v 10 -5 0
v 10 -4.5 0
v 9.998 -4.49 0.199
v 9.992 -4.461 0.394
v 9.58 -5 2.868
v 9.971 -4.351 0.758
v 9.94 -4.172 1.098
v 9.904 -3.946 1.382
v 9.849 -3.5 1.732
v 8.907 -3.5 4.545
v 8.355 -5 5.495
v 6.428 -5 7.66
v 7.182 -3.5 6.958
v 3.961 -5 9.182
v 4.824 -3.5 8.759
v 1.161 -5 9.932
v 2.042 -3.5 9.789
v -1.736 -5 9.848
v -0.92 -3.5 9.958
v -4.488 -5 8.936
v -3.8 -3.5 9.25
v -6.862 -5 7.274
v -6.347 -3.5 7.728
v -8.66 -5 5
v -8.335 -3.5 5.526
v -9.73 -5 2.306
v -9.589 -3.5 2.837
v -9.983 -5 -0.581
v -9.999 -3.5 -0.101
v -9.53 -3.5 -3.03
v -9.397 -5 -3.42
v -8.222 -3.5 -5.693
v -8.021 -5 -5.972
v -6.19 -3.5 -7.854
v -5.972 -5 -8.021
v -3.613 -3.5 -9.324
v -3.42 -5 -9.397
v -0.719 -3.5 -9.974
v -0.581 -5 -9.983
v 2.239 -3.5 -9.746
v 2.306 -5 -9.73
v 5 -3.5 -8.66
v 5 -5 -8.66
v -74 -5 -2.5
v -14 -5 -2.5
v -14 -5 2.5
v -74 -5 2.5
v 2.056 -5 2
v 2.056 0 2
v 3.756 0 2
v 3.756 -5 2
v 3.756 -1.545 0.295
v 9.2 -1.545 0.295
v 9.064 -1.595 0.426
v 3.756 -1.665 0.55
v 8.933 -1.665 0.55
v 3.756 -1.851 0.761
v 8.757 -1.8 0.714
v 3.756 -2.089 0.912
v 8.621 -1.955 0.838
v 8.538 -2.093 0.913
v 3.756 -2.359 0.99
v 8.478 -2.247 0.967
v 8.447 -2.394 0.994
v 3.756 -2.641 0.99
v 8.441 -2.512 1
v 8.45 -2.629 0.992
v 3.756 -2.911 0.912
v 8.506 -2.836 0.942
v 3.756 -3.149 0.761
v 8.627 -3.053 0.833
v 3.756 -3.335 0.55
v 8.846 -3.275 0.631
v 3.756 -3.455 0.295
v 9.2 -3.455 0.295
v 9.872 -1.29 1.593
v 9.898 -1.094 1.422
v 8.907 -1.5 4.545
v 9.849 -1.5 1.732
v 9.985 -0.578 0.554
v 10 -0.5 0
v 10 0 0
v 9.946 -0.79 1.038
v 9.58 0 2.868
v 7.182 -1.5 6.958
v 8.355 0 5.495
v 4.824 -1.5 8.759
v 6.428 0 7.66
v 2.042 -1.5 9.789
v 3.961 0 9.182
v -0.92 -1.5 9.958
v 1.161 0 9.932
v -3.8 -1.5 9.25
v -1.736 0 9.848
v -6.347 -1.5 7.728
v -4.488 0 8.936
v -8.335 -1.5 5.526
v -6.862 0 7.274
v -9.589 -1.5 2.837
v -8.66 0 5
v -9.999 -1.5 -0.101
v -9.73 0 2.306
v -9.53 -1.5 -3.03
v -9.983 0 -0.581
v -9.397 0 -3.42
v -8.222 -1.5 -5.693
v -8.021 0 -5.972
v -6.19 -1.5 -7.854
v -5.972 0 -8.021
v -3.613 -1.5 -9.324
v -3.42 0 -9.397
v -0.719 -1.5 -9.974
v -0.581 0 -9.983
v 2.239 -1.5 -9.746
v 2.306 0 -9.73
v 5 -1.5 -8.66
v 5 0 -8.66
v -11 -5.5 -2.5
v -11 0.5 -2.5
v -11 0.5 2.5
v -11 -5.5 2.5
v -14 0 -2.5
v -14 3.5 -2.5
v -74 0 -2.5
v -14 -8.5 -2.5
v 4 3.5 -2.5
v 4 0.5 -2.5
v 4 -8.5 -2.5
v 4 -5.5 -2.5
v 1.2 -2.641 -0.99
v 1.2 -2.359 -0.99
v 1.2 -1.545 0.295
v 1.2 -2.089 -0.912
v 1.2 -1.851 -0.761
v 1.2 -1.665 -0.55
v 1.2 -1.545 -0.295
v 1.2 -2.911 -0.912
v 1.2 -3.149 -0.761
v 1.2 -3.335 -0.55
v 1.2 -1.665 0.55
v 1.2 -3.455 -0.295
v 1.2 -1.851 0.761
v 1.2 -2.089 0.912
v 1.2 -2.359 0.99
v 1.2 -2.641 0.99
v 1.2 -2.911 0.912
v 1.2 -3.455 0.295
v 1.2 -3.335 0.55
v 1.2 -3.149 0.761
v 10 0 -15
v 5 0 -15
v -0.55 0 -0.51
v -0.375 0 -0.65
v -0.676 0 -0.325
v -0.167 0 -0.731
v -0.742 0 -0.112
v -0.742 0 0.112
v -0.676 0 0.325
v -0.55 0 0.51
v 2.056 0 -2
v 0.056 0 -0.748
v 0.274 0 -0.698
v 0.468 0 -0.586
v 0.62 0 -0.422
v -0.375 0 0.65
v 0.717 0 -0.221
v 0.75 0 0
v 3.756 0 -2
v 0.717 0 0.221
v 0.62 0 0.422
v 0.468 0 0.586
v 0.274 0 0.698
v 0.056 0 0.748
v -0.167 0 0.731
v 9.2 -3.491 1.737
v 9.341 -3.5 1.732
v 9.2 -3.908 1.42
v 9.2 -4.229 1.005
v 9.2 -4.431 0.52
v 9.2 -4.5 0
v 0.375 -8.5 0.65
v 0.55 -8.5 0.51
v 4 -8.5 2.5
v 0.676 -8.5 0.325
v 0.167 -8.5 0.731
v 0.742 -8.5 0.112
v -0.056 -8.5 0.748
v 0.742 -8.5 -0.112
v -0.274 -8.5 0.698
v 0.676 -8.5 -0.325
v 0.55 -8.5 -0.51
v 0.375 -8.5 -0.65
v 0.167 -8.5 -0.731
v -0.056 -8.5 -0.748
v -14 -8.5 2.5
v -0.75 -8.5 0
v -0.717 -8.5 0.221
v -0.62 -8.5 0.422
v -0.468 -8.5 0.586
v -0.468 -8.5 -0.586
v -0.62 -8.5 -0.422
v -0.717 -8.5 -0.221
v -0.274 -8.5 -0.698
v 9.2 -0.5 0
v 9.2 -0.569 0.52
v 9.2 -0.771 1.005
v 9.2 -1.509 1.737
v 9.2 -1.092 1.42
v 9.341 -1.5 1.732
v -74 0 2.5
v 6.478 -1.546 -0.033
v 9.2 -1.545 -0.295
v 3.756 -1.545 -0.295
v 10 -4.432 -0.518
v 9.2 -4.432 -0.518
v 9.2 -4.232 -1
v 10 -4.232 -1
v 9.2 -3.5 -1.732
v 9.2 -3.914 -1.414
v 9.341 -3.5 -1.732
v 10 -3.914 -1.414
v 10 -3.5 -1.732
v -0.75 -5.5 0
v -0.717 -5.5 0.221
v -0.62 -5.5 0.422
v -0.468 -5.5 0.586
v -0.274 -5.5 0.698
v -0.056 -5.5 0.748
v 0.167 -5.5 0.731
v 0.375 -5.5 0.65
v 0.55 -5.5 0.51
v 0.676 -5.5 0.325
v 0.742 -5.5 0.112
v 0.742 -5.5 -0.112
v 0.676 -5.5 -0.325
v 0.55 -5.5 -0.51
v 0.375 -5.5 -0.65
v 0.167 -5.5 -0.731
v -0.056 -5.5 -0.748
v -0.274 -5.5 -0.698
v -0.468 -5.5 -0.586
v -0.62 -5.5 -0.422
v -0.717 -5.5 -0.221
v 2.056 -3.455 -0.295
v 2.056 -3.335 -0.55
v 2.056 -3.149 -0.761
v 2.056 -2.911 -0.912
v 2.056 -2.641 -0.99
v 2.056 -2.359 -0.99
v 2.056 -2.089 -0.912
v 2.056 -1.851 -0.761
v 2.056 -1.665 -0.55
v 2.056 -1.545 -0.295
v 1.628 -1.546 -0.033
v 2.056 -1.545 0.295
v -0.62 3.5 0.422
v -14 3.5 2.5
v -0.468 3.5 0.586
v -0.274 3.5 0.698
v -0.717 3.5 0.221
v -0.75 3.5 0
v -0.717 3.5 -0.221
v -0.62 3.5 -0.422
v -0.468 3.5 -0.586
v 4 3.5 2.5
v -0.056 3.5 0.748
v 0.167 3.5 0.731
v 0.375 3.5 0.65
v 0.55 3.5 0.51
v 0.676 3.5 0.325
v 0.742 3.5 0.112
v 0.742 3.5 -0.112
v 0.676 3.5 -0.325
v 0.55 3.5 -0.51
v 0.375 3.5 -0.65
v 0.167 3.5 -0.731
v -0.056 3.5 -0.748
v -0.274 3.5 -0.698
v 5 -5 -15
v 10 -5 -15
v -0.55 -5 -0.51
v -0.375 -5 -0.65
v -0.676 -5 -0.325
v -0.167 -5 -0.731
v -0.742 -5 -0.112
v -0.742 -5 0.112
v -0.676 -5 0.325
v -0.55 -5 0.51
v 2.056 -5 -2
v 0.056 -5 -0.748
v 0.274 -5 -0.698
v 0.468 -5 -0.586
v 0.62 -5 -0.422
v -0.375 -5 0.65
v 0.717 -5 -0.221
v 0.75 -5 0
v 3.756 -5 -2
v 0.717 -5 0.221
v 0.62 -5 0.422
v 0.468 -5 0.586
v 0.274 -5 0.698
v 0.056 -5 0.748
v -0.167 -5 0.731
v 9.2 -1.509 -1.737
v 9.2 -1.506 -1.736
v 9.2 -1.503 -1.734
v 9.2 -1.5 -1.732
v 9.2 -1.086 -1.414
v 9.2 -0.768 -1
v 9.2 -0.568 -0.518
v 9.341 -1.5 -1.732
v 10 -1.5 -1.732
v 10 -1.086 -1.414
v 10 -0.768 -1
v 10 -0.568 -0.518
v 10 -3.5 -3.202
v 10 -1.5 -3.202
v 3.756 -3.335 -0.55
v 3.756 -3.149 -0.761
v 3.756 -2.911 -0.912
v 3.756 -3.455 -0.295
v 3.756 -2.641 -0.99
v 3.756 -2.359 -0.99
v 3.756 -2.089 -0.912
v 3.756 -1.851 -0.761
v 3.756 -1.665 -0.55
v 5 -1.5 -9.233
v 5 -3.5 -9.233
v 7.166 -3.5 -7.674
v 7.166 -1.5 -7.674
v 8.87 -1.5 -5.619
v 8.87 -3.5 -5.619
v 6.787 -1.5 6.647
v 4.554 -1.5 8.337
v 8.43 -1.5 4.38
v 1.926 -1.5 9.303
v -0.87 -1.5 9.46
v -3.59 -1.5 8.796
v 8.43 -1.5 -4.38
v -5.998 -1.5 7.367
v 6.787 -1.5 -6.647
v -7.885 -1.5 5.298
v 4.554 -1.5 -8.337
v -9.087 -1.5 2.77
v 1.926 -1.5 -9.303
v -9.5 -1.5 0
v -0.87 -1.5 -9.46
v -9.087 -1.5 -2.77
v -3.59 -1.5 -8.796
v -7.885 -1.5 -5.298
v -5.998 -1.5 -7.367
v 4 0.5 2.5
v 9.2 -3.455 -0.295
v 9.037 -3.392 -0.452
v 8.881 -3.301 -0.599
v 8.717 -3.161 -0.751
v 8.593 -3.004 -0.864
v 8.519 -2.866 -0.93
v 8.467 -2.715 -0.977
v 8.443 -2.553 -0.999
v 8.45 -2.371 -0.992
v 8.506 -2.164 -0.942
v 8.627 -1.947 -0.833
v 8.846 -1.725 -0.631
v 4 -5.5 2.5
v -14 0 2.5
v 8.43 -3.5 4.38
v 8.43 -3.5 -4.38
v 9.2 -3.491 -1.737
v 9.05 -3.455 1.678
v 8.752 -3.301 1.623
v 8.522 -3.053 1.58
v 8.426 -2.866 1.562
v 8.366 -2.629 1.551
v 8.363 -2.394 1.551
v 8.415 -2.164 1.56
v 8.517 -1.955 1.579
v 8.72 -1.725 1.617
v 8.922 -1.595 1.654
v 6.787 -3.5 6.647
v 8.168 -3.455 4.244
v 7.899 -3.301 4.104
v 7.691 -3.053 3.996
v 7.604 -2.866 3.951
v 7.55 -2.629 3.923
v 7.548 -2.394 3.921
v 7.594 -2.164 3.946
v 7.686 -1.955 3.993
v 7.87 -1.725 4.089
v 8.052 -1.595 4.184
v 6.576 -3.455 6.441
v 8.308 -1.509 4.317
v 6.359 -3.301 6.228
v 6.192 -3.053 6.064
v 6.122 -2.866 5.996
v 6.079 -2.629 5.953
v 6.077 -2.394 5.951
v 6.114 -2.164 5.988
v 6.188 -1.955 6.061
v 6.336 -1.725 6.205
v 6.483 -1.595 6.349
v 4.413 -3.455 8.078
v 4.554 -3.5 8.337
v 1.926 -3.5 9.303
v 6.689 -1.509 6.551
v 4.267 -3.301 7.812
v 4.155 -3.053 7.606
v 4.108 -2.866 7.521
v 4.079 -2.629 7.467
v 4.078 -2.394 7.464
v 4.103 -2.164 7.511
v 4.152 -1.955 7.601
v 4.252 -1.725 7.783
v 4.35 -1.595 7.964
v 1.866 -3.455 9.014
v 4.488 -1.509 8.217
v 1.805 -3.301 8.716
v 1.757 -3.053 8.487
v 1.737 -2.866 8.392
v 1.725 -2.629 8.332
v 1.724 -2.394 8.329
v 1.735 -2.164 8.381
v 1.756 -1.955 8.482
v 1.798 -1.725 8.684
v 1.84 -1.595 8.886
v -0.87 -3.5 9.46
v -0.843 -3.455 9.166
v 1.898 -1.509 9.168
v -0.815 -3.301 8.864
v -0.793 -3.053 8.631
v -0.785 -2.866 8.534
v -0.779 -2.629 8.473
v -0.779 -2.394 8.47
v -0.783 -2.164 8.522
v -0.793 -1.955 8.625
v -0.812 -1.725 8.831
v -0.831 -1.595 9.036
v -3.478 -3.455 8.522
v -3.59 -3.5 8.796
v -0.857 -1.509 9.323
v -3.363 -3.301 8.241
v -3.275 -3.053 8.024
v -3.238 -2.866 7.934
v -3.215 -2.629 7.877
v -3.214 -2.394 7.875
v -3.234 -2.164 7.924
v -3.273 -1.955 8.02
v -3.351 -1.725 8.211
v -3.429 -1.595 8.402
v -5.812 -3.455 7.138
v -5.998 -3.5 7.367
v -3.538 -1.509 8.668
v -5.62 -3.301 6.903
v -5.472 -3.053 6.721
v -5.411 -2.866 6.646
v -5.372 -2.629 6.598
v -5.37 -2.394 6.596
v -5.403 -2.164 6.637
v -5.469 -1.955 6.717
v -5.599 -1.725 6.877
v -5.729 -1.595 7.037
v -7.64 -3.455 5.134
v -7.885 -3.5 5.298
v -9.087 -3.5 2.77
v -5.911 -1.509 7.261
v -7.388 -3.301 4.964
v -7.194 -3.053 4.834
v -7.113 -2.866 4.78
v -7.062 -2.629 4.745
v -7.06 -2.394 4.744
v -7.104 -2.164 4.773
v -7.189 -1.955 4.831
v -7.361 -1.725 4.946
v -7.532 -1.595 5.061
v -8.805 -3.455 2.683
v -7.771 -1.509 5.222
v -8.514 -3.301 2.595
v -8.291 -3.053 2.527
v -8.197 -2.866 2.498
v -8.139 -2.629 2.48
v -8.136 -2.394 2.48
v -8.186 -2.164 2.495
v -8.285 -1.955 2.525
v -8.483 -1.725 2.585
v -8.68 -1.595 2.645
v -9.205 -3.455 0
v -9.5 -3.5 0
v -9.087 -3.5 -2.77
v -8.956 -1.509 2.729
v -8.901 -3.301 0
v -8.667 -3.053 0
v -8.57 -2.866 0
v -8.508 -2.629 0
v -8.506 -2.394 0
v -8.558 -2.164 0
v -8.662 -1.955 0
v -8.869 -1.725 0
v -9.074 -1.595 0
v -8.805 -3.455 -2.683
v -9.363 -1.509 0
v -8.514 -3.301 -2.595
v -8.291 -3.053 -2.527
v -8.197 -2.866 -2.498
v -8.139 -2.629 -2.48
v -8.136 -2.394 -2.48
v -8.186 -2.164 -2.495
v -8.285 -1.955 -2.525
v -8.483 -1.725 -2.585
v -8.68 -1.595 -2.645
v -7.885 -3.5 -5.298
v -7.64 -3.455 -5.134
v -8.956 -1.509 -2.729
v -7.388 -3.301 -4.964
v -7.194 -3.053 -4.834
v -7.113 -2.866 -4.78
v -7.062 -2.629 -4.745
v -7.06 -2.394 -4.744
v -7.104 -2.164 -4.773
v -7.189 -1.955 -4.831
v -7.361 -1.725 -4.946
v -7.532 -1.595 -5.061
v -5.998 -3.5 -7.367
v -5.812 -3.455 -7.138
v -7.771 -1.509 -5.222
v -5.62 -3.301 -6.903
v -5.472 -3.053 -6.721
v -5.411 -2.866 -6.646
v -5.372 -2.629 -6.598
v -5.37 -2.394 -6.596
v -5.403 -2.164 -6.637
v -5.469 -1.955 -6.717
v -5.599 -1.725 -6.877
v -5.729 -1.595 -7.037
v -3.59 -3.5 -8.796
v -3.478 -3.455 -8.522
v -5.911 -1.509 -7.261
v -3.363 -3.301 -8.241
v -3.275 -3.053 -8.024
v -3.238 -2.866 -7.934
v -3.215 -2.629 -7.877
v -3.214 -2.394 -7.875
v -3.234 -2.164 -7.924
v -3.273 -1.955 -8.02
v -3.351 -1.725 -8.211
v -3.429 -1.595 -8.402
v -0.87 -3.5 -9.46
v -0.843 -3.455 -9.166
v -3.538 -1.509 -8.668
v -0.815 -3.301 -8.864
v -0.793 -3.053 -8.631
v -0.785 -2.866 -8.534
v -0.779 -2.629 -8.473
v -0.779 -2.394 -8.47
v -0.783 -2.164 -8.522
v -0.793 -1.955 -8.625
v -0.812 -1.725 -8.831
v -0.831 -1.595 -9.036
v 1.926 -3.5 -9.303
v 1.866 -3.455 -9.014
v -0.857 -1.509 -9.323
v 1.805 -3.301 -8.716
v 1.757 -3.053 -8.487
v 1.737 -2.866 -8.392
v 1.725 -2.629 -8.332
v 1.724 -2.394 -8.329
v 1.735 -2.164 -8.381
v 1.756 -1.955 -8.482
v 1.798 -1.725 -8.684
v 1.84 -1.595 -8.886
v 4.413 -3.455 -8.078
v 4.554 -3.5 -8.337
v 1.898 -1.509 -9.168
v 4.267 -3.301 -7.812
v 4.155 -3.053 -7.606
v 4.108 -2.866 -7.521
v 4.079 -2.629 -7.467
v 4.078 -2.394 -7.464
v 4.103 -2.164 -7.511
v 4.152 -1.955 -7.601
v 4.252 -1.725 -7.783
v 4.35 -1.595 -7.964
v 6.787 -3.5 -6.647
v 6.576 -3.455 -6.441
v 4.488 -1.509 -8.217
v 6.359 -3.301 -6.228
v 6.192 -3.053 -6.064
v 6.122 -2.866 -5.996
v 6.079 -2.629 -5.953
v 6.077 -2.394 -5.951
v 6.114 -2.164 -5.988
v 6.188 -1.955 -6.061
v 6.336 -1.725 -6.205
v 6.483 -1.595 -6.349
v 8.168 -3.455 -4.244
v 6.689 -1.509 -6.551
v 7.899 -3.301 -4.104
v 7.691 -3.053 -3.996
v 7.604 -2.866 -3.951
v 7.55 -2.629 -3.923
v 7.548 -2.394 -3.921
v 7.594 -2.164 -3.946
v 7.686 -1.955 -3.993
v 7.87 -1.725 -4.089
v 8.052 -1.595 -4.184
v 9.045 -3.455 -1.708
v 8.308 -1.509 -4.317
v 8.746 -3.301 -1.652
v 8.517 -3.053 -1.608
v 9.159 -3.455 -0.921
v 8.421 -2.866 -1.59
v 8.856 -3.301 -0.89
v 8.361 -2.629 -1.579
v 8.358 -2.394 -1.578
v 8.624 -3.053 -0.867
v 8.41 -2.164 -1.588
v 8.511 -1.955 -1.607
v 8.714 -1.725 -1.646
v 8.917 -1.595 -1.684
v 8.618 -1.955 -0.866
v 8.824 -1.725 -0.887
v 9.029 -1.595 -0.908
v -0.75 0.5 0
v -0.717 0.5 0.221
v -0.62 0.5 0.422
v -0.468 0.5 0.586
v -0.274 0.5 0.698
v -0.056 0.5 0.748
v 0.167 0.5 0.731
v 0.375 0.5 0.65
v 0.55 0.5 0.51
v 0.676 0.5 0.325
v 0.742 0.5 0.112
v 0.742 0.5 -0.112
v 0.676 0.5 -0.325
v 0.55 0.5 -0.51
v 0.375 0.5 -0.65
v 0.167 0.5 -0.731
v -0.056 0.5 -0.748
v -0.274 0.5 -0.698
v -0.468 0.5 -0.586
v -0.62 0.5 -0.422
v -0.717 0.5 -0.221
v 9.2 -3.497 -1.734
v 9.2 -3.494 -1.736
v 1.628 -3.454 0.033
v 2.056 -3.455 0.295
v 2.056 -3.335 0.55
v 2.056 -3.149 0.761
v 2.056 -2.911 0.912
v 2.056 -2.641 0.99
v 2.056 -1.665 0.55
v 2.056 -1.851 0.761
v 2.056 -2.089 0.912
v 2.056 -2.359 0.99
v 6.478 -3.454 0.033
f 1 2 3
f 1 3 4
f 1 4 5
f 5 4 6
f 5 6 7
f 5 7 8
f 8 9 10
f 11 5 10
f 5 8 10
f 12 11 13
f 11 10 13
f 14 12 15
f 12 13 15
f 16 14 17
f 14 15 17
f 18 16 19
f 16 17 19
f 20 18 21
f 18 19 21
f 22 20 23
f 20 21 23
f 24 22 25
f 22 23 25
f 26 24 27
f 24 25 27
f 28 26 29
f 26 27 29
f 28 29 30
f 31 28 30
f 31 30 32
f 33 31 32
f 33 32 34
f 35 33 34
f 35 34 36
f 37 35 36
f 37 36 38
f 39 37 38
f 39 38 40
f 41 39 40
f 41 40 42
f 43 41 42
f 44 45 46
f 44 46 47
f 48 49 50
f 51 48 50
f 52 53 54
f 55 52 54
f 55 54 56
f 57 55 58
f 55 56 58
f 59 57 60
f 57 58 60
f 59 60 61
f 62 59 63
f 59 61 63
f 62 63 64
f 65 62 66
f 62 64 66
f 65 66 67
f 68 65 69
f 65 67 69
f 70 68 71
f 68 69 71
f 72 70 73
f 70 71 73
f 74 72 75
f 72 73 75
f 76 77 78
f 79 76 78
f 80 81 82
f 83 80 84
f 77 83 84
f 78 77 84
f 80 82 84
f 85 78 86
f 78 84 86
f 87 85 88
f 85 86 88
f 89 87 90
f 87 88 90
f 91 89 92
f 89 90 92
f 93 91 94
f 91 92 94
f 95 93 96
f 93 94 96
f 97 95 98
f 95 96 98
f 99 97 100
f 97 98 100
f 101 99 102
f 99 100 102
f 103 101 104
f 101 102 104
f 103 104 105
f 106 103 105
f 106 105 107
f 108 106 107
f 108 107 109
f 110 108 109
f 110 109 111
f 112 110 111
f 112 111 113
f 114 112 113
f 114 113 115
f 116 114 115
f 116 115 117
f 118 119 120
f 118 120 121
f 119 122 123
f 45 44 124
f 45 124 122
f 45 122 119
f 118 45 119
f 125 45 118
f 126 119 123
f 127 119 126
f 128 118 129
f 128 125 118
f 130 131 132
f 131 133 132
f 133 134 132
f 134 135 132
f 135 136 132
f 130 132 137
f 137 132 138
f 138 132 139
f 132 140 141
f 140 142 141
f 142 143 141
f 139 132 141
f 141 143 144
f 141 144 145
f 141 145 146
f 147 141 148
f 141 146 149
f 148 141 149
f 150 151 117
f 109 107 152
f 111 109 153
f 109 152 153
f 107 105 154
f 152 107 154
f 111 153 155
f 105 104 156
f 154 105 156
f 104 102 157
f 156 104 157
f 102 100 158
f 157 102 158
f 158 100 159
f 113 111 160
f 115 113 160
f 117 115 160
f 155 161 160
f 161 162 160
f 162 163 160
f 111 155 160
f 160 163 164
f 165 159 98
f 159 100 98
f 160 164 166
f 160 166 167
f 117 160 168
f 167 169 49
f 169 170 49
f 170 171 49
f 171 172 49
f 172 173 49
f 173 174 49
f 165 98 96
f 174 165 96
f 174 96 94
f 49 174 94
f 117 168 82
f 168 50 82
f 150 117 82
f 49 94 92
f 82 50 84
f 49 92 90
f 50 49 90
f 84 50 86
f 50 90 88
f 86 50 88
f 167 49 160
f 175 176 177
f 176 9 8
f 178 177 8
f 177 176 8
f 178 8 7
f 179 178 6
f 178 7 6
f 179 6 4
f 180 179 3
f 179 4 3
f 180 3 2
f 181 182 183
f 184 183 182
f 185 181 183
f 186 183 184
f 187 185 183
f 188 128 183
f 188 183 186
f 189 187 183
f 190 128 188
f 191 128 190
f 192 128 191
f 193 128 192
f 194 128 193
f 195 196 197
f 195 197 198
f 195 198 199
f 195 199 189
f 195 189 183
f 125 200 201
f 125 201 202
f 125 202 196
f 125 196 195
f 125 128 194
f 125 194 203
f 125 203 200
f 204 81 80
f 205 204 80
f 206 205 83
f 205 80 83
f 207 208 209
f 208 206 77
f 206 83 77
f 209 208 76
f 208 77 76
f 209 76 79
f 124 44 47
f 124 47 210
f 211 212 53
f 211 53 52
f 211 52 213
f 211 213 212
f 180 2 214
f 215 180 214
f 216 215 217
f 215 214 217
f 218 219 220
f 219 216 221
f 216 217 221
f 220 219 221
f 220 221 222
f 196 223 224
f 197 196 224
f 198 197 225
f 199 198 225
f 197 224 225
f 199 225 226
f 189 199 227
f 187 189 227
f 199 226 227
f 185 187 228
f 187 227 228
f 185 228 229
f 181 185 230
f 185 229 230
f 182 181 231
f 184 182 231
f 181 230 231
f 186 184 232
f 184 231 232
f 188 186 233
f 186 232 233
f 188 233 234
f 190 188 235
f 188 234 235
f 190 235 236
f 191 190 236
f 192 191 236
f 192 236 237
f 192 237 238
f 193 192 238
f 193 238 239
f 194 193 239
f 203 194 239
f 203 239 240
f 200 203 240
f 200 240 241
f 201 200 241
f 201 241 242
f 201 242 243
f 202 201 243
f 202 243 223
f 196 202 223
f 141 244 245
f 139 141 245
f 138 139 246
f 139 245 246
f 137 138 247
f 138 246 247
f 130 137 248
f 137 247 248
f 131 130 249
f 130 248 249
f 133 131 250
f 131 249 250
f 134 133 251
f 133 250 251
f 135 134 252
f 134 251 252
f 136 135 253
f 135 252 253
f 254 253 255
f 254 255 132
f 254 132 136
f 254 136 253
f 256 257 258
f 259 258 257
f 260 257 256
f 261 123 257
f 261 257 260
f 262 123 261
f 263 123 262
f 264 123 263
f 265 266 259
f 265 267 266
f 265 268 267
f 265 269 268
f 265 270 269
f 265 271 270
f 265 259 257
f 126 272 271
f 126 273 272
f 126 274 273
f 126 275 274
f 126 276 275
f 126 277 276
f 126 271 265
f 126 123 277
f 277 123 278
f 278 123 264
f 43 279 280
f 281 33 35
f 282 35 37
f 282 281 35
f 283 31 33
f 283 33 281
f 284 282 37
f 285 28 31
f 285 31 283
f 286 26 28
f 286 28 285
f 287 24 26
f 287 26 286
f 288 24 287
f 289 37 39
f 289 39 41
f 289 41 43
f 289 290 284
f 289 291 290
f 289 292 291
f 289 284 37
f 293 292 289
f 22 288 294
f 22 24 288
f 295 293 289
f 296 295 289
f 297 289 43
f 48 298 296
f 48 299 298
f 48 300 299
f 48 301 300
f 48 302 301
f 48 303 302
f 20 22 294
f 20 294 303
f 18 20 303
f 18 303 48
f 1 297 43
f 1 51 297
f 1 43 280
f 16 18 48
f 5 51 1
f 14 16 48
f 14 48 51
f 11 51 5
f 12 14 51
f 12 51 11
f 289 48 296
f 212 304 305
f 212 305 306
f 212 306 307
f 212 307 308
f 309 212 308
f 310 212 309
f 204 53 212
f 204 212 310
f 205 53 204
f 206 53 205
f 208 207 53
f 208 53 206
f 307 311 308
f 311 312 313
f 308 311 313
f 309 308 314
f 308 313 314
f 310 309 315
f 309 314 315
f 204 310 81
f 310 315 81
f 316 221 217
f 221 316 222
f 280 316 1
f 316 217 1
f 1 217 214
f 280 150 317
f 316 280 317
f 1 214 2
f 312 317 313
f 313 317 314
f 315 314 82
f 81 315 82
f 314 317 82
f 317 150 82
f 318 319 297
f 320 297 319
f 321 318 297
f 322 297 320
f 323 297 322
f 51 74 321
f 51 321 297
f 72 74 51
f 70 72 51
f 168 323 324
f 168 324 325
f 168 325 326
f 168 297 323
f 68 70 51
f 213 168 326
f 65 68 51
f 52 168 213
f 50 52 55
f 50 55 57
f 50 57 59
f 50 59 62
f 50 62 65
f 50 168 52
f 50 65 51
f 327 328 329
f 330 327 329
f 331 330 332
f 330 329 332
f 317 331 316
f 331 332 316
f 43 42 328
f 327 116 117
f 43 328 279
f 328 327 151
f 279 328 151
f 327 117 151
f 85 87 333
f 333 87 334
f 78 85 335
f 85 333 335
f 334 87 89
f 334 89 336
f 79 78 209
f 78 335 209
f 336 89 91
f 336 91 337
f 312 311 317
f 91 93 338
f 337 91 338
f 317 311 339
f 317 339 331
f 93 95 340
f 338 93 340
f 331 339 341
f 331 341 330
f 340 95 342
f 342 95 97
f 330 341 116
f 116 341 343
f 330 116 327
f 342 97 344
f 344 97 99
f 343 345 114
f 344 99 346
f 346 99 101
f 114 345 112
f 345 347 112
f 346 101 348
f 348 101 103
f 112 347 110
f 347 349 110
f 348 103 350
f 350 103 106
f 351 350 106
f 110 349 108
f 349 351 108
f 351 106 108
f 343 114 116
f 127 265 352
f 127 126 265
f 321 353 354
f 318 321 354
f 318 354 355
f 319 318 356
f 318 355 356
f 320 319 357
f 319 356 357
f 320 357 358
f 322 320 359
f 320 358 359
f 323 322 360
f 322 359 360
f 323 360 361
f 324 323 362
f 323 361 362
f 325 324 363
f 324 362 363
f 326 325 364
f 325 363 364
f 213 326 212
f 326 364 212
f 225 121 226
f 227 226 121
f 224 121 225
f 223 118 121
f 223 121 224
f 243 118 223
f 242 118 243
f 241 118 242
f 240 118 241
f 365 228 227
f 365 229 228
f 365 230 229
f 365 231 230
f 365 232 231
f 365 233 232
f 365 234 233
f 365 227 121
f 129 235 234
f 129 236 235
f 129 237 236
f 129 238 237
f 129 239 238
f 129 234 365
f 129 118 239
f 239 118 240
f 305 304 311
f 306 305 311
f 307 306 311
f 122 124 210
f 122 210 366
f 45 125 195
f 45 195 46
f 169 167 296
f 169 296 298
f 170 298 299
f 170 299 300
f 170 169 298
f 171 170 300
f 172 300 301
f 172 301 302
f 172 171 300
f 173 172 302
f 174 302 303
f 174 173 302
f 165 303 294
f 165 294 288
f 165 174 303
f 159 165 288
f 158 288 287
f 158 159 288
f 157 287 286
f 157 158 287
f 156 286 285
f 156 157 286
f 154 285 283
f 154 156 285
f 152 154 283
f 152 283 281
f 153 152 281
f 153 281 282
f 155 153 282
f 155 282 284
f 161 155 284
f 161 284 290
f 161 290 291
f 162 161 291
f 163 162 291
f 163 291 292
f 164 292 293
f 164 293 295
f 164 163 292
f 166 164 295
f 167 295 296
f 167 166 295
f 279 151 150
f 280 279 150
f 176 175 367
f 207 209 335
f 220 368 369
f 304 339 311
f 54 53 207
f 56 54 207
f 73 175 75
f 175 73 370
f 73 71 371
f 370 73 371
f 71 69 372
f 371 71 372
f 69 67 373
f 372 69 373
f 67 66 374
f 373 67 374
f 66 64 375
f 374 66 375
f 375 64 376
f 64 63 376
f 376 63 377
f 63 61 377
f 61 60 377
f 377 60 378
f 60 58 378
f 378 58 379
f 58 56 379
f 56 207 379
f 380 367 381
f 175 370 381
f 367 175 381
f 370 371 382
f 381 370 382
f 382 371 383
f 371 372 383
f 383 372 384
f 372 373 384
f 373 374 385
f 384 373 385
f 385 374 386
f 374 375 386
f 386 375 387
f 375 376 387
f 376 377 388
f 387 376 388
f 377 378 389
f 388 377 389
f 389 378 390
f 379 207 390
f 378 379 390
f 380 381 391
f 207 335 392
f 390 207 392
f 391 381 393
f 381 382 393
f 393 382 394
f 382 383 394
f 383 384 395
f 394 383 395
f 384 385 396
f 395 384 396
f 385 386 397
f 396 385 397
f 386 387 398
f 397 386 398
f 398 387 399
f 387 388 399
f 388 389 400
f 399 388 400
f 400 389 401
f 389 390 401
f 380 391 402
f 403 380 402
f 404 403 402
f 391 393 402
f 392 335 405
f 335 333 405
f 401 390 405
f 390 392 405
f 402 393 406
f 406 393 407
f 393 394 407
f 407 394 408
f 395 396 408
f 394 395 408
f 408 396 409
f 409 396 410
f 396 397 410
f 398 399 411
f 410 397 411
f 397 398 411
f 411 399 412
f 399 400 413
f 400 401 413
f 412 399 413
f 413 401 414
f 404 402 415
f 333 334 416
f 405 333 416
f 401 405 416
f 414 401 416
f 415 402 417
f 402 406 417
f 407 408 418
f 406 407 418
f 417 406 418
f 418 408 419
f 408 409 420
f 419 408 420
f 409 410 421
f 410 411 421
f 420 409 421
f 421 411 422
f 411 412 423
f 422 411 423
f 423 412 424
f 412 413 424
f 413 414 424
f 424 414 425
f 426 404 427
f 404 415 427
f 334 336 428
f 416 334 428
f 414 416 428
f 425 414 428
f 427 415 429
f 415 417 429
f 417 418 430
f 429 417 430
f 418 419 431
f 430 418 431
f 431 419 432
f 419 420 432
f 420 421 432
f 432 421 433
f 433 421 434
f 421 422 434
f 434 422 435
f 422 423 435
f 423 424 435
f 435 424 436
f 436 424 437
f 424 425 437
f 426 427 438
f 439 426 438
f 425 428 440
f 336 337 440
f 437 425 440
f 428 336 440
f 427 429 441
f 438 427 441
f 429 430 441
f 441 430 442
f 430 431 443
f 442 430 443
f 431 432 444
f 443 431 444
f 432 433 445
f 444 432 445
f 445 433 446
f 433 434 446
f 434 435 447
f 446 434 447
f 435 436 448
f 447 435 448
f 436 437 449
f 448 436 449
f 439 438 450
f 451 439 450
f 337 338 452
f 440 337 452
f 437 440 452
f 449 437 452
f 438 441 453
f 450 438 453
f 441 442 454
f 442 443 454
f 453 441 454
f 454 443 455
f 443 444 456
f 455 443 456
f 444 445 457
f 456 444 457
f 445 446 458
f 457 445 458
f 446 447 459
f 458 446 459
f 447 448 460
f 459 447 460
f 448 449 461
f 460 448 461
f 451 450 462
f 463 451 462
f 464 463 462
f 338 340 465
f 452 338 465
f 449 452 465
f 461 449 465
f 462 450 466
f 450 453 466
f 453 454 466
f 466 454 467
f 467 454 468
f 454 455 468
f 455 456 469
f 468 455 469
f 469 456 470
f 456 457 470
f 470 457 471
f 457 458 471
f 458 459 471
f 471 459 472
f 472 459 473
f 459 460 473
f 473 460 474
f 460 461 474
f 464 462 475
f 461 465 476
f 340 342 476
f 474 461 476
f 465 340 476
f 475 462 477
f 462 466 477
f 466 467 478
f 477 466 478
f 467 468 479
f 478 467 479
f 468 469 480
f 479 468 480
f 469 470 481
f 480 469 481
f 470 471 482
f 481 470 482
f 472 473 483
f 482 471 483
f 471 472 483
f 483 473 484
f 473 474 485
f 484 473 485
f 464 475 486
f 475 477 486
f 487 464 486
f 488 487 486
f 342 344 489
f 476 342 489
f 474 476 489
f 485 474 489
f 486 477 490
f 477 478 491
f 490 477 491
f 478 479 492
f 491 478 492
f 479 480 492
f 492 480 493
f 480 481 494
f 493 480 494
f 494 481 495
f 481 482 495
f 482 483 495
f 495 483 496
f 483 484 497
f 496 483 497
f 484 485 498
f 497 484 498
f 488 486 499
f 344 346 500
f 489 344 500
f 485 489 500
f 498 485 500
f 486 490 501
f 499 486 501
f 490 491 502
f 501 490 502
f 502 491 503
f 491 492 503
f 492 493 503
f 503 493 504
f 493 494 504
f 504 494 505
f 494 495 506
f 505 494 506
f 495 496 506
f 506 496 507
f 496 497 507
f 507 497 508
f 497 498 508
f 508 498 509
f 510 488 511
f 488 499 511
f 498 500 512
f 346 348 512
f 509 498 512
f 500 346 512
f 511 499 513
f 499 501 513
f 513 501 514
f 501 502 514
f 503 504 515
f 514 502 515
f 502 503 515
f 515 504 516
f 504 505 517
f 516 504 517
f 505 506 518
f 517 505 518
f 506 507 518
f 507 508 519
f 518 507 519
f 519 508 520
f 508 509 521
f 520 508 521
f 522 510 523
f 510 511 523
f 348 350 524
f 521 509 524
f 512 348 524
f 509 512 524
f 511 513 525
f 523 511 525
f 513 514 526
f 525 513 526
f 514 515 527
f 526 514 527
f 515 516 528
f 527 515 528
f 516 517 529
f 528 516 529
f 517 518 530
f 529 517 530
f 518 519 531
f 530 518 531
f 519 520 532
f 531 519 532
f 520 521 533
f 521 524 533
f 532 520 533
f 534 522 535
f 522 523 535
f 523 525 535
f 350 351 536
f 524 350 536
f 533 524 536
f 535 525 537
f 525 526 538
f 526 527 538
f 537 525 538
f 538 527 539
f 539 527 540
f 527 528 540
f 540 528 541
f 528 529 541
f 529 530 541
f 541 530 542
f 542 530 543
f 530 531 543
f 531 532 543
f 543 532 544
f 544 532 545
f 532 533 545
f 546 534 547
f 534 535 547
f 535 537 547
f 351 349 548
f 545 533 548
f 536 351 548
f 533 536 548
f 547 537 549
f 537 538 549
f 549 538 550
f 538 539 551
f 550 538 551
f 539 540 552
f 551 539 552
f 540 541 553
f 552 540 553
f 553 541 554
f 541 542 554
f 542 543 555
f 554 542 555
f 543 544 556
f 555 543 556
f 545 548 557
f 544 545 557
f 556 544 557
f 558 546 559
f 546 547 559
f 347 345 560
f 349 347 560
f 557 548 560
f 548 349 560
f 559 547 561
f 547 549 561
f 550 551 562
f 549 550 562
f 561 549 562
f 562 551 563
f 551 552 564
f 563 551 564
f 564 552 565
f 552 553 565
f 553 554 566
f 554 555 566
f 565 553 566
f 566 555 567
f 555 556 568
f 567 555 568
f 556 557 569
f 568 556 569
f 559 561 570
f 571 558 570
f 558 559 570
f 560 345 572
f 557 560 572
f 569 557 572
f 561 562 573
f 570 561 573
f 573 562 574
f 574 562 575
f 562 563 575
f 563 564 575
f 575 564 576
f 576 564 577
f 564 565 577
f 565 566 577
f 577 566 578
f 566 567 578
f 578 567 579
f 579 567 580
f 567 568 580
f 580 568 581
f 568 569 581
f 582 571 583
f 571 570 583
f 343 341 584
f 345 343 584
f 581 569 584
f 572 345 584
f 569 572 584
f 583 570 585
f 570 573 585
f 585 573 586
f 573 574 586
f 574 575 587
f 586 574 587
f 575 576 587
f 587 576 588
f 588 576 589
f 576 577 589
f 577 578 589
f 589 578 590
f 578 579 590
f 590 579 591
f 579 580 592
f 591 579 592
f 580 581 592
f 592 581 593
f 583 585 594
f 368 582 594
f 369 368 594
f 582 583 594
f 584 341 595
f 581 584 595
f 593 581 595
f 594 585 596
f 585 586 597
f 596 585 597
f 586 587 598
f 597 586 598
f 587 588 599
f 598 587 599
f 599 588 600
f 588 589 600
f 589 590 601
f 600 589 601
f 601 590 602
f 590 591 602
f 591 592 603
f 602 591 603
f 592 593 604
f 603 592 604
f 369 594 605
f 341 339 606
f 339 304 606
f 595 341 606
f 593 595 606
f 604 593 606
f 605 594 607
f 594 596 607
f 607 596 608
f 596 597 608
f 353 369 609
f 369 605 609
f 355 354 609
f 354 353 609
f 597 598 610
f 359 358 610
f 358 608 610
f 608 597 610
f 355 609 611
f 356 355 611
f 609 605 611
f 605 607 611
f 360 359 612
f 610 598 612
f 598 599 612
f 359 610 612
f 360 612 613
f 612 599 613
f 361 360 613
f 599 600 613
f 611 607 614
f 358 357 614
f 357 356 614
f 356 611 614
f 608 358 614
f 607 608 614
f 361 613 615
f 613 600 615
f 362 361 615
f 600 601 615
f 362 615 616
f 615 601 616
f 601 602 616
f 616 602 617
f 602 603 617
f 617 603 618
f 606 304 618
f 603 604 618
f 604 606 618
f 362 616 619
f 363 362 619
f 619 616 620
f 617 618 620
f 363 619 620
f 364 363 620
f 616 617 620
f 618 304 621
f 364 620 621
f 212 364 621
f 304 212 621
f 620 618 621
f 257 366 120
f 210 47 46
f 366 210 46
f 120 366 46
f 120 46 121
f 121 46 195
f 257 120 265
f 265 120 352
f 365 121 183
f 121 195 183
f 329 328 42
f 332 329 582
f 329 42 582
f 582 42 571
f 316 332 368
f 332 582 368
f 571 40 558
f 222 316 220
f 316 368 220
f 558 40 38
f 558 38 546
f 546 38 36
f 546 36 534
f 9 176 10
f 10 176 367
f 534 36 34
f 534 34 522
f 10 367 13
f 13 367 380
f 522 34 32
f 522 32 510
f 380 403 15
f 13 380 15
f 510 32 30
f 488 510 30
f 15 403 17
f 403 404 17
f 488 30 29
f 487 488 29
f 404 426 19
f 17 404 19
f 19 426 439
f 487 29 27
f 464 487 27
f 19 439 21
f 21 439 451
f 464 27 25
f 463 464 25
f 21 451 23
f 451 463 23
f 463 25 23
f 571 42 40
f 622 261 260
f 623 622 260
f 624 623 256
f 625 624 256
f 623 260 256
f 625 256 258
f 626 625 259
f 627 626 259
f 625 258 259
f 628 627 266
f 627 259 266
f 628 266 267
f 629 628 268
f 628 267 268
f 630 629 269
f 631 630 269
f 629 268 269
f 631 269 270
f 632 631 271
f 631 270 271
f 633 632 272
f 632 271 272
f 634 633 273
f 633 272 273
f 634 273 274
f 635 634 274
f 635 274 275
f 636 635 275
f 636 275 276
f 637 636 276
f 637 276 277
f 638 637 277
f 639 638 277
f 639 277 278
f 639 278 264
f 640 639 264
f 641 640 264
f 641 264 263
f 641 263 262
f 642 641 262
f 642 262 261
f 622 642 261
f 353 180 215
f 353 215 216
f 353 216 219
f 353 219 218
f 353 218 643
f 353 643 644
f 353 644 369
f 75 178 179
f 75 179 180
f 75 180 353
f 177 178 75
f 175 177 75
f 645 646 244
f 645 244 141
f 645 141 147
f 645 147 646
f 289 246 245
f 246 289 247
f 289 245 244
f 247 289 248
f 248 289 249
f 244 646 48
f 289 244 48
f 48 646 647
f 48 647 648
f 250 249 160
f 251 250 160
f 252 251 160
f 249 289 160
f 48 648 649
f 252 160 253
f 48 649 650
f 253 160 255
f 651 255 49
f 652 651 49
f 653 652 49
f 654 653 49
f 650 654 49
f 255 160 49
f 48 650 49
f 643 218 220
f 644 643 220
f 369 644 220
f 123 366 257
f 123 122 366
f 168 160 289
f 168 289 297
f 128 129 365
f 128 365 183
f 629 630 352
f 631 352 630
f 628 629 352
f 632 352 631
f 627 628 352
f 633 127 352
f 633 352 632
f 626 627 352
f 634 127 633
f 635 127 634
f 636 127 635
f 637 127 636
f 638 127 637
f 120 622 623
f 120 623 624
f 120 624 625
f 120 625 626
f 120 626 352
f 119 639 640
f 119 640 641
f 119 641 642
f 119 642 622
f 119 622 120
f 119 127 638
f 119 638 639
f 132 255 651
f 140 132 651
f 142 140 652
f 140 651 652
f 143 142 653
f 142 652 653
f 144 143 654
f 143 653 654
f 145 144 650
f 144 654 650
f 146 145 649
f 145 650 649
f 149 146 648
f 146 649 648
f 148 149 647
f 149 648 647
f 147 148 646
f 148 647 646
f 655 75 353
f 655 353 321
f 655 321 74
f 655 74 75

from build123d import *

# Parameters (mm, degrees)
F0_R           = 0.75
F0_W           = 1.7
F0_H           = 4
F1_DEPTH       = 5
F6_DEPTH       = 0.8
F8_DEPTH       = 8
F10_DEPTH      = 2.5
F10_DEPTH_BACK = 2.5
F11_R          = 0.75
F12_DEPTH      = 12


with BuildPart() as f1:
    # F0 (on Front) → F1 (new body)
    with BuildSketch(Plane.XZ):
        with BuildLine():
            Line((10, -15), (10, 0))
            ThreePointArc((10, 0), (-8.6602540378, 5), (5, -8.6602540378))
            Line((5, -8.6602540378), (5, -15))
            Line((5, -15), (10, -15))
        make_face()
        Circle(F0_R, mode=Mode.SUBTRACT)
        with Locations((2.9064579867, 0)):
            Rectangle(F0_W, F0_H, mode=Mode.SUBTRACT)
    extrude(amount=F1_DEPTH)

    # F3 (on Right) → F4 (revolve, cut)
    with BuildSketch(Plane.YZ):
        with BuildLine():
            Line((-1.5, 10), (-1.5, 10.5))
            Line((-1.5, 10.5), (-3.5, 10.5))
            Line((-3.5, 10.5), (-3.5, 10))
            Line((-3.5, 10), (-3.5, 9.5))
            ThreePointArc((-3.5, 9.5), (-2.5, 8.5), (-1.5, 9.5))
            Line((-1.5, 9.5), (-1.5, 10))
        make_face()
    revolve(axis=Axis((0, -2.5, 0), (0, -1, 0)), mode=Mode.SUBTRACT)

    # F5 (on face) → F6 (cut)
    with BuildSketch(Plane.YZ.offset(10)):
        with BuildLine():
            Line((-3.5, 0), (-4.5, 0))
            ThreePointArc((-4.5, 0), (-4.2320508076, -1), (-3.5, -1.7320508076))
            Line((-3.5, -1.7320508076), (-3.5, 0))
        make_face()
        with BuildLine():
            ThreePointArc((-1.5, -1.7320508076), (-0.7679491924, -1), (-0.5, 0))
            Line((-0.5, 0), (-1.5, 0))
            Line((-1.5, 0), (-1.5, -1.7320508076))
        make_face()
        with BuildLine():
            Line((-1.5, 0), (-0.5, 0))
            ThreePointArc((-0.5, 0), (-2.5, 2), (-4.5, 0))
            Line((-4.5, 0), (-3.5, 0))
            Line((-3.5, 0), (-3.5, -1.7320508076))
            ThreePointArc((-3.5, -1.7320508076), (-2.5, -2), (-1.5, -1.7320508076))
            Line((-1.5, -1.7320508076), (-1.5, 0))
        make_face()
    extrude(amount=-F6_DEPTH, mode=Mode.SUBTRACT)

    # F7 (on face) → F8 (cut)
    with BuildSketch(Plane.YZ.offset(9.2)):
        with BuildLine():
            add(Edge.make_bspline(
                [(-1.5445840368, 0.295263166), (-1.5450482012, 0.2484405202), (-1.5454297015, 0.2016073034), (-1.5457263882, 0.1547656753), (-1.5459366901, 0.1079178993), (-1.5460596334, 0.0610663461), (-1.5460948535, 0.0142134972), (-1.5460007359, -0.0701643408), (-1.5459027565, -0.1076899148), (-1.545748778, -0.1452134741), (-1.5455391734, -0.1827337648), (-1.5452745645, -0.2202495788), (-1.5449558177, -0.2577597532), (-1.5445840375, -0.2952631684)],
                knots=[0.4383158786, 0.4383158786, 0.4383158786, 0.4383158786, 0.4383158786, 0.4383158786, 0.4383158786, 0.4383158786, 0.5068188161, 0.5068188161, 0.5068188161, 0.5068188161, 0.5068188161, 0.5068188161, 0.5616870319, 0.5616870319, 0.5616870319, 0.5616870319, 0.5616870319, 0.5616870319, 0.5616870319, 0.5616870319], degree=7))
            ThreePointArc((-1.5445840368, 0.295263166), (-2.4999999988, 1), (-3.4554159625, 0.2952631684))
            add(Edge.make_bspline(
                [(-3.4554159632, -0.295263166), (-3.4549517988, -0.2484405202), (-3.4545702985, -0.2016073034), (-3.4542736118, -0.1547656753), (-3.4540633099, -0.1079178993), (-3.4539403666, -0.0610663461), (-3.4539051465, -0.0142134972), (-3.4539992641, 0.0701643408), (-3.4540972435, 0.1076899148), (-3.454251222, 0.1452134741), (-3.4544608266, 0.1827337648), (-3.4547254355, 0.2202495788), (-3.4550441823, 0.2577597532), (-3.4554159625, 0.2952631684)],
                knots=[0.4383158786, 0.4383158786, 0.4383158786, 0.4383158786, 0.4383158786, 0.4383158786, 0.4383158786, 0.4383158786, 0.5068188161, 0.5068188161, 0.5068188161, 0.5068188161, 0.5068188161, 0.5068188161, 0.5616870319, 0.5616870319, 0.5616870319, 0.5616870319, 0.5616870319, 0.5616870319, 0.5616870319, 0.5616870319], degree=7))
            ThreePointArc((-3.4554159632, -0.295263166), (-2.5000000012, -1), (-1.5445840375, -0.2952631684))
        make_face()
    extrude(amount=-F8_DEPTH, mode=Mode.SUBTRACT)


with BuildPart() as f10:
    # F9 (on plane+point) → F10 (new body, two sides)
    with BuildSketch(Plane(origin=(0, 0, 0), x_dir=(1, 0, 0), z_dir=(0, 0, -1))) as f10_sk:
        Polygon((4, -3.5), (4, -0.5), (-11, -0.5), (-11, 2.5), (-74, 2.5), (-74, 0), (-14, 0), (-14, -3.5), align=None)
        Polygon((-74, 2.5), (-11, 2.5), (-11, 5.5), (4, 5.5), (4, 8.5), (-14, 8.5), (-14, 5), (-74, 5), align=None)
    extrude(amount=F10_DEPTH)
    extrude(f10_sk.sketch, amount=-F10_DEPTH_BACK)

    # F11 (on face) → F12 (cut, through all)
    with BuildSketch(Plane(origin=(0, 3.5, 0), x_dir=(-1, 0, 0), z_dir=(0, 1, 0))):
        Circle(F11_R)
    extrude(amount=-F12_DEPTH, mode=Mode.SUBTRACT)


solid = Compound([f1.part, f10.part])
